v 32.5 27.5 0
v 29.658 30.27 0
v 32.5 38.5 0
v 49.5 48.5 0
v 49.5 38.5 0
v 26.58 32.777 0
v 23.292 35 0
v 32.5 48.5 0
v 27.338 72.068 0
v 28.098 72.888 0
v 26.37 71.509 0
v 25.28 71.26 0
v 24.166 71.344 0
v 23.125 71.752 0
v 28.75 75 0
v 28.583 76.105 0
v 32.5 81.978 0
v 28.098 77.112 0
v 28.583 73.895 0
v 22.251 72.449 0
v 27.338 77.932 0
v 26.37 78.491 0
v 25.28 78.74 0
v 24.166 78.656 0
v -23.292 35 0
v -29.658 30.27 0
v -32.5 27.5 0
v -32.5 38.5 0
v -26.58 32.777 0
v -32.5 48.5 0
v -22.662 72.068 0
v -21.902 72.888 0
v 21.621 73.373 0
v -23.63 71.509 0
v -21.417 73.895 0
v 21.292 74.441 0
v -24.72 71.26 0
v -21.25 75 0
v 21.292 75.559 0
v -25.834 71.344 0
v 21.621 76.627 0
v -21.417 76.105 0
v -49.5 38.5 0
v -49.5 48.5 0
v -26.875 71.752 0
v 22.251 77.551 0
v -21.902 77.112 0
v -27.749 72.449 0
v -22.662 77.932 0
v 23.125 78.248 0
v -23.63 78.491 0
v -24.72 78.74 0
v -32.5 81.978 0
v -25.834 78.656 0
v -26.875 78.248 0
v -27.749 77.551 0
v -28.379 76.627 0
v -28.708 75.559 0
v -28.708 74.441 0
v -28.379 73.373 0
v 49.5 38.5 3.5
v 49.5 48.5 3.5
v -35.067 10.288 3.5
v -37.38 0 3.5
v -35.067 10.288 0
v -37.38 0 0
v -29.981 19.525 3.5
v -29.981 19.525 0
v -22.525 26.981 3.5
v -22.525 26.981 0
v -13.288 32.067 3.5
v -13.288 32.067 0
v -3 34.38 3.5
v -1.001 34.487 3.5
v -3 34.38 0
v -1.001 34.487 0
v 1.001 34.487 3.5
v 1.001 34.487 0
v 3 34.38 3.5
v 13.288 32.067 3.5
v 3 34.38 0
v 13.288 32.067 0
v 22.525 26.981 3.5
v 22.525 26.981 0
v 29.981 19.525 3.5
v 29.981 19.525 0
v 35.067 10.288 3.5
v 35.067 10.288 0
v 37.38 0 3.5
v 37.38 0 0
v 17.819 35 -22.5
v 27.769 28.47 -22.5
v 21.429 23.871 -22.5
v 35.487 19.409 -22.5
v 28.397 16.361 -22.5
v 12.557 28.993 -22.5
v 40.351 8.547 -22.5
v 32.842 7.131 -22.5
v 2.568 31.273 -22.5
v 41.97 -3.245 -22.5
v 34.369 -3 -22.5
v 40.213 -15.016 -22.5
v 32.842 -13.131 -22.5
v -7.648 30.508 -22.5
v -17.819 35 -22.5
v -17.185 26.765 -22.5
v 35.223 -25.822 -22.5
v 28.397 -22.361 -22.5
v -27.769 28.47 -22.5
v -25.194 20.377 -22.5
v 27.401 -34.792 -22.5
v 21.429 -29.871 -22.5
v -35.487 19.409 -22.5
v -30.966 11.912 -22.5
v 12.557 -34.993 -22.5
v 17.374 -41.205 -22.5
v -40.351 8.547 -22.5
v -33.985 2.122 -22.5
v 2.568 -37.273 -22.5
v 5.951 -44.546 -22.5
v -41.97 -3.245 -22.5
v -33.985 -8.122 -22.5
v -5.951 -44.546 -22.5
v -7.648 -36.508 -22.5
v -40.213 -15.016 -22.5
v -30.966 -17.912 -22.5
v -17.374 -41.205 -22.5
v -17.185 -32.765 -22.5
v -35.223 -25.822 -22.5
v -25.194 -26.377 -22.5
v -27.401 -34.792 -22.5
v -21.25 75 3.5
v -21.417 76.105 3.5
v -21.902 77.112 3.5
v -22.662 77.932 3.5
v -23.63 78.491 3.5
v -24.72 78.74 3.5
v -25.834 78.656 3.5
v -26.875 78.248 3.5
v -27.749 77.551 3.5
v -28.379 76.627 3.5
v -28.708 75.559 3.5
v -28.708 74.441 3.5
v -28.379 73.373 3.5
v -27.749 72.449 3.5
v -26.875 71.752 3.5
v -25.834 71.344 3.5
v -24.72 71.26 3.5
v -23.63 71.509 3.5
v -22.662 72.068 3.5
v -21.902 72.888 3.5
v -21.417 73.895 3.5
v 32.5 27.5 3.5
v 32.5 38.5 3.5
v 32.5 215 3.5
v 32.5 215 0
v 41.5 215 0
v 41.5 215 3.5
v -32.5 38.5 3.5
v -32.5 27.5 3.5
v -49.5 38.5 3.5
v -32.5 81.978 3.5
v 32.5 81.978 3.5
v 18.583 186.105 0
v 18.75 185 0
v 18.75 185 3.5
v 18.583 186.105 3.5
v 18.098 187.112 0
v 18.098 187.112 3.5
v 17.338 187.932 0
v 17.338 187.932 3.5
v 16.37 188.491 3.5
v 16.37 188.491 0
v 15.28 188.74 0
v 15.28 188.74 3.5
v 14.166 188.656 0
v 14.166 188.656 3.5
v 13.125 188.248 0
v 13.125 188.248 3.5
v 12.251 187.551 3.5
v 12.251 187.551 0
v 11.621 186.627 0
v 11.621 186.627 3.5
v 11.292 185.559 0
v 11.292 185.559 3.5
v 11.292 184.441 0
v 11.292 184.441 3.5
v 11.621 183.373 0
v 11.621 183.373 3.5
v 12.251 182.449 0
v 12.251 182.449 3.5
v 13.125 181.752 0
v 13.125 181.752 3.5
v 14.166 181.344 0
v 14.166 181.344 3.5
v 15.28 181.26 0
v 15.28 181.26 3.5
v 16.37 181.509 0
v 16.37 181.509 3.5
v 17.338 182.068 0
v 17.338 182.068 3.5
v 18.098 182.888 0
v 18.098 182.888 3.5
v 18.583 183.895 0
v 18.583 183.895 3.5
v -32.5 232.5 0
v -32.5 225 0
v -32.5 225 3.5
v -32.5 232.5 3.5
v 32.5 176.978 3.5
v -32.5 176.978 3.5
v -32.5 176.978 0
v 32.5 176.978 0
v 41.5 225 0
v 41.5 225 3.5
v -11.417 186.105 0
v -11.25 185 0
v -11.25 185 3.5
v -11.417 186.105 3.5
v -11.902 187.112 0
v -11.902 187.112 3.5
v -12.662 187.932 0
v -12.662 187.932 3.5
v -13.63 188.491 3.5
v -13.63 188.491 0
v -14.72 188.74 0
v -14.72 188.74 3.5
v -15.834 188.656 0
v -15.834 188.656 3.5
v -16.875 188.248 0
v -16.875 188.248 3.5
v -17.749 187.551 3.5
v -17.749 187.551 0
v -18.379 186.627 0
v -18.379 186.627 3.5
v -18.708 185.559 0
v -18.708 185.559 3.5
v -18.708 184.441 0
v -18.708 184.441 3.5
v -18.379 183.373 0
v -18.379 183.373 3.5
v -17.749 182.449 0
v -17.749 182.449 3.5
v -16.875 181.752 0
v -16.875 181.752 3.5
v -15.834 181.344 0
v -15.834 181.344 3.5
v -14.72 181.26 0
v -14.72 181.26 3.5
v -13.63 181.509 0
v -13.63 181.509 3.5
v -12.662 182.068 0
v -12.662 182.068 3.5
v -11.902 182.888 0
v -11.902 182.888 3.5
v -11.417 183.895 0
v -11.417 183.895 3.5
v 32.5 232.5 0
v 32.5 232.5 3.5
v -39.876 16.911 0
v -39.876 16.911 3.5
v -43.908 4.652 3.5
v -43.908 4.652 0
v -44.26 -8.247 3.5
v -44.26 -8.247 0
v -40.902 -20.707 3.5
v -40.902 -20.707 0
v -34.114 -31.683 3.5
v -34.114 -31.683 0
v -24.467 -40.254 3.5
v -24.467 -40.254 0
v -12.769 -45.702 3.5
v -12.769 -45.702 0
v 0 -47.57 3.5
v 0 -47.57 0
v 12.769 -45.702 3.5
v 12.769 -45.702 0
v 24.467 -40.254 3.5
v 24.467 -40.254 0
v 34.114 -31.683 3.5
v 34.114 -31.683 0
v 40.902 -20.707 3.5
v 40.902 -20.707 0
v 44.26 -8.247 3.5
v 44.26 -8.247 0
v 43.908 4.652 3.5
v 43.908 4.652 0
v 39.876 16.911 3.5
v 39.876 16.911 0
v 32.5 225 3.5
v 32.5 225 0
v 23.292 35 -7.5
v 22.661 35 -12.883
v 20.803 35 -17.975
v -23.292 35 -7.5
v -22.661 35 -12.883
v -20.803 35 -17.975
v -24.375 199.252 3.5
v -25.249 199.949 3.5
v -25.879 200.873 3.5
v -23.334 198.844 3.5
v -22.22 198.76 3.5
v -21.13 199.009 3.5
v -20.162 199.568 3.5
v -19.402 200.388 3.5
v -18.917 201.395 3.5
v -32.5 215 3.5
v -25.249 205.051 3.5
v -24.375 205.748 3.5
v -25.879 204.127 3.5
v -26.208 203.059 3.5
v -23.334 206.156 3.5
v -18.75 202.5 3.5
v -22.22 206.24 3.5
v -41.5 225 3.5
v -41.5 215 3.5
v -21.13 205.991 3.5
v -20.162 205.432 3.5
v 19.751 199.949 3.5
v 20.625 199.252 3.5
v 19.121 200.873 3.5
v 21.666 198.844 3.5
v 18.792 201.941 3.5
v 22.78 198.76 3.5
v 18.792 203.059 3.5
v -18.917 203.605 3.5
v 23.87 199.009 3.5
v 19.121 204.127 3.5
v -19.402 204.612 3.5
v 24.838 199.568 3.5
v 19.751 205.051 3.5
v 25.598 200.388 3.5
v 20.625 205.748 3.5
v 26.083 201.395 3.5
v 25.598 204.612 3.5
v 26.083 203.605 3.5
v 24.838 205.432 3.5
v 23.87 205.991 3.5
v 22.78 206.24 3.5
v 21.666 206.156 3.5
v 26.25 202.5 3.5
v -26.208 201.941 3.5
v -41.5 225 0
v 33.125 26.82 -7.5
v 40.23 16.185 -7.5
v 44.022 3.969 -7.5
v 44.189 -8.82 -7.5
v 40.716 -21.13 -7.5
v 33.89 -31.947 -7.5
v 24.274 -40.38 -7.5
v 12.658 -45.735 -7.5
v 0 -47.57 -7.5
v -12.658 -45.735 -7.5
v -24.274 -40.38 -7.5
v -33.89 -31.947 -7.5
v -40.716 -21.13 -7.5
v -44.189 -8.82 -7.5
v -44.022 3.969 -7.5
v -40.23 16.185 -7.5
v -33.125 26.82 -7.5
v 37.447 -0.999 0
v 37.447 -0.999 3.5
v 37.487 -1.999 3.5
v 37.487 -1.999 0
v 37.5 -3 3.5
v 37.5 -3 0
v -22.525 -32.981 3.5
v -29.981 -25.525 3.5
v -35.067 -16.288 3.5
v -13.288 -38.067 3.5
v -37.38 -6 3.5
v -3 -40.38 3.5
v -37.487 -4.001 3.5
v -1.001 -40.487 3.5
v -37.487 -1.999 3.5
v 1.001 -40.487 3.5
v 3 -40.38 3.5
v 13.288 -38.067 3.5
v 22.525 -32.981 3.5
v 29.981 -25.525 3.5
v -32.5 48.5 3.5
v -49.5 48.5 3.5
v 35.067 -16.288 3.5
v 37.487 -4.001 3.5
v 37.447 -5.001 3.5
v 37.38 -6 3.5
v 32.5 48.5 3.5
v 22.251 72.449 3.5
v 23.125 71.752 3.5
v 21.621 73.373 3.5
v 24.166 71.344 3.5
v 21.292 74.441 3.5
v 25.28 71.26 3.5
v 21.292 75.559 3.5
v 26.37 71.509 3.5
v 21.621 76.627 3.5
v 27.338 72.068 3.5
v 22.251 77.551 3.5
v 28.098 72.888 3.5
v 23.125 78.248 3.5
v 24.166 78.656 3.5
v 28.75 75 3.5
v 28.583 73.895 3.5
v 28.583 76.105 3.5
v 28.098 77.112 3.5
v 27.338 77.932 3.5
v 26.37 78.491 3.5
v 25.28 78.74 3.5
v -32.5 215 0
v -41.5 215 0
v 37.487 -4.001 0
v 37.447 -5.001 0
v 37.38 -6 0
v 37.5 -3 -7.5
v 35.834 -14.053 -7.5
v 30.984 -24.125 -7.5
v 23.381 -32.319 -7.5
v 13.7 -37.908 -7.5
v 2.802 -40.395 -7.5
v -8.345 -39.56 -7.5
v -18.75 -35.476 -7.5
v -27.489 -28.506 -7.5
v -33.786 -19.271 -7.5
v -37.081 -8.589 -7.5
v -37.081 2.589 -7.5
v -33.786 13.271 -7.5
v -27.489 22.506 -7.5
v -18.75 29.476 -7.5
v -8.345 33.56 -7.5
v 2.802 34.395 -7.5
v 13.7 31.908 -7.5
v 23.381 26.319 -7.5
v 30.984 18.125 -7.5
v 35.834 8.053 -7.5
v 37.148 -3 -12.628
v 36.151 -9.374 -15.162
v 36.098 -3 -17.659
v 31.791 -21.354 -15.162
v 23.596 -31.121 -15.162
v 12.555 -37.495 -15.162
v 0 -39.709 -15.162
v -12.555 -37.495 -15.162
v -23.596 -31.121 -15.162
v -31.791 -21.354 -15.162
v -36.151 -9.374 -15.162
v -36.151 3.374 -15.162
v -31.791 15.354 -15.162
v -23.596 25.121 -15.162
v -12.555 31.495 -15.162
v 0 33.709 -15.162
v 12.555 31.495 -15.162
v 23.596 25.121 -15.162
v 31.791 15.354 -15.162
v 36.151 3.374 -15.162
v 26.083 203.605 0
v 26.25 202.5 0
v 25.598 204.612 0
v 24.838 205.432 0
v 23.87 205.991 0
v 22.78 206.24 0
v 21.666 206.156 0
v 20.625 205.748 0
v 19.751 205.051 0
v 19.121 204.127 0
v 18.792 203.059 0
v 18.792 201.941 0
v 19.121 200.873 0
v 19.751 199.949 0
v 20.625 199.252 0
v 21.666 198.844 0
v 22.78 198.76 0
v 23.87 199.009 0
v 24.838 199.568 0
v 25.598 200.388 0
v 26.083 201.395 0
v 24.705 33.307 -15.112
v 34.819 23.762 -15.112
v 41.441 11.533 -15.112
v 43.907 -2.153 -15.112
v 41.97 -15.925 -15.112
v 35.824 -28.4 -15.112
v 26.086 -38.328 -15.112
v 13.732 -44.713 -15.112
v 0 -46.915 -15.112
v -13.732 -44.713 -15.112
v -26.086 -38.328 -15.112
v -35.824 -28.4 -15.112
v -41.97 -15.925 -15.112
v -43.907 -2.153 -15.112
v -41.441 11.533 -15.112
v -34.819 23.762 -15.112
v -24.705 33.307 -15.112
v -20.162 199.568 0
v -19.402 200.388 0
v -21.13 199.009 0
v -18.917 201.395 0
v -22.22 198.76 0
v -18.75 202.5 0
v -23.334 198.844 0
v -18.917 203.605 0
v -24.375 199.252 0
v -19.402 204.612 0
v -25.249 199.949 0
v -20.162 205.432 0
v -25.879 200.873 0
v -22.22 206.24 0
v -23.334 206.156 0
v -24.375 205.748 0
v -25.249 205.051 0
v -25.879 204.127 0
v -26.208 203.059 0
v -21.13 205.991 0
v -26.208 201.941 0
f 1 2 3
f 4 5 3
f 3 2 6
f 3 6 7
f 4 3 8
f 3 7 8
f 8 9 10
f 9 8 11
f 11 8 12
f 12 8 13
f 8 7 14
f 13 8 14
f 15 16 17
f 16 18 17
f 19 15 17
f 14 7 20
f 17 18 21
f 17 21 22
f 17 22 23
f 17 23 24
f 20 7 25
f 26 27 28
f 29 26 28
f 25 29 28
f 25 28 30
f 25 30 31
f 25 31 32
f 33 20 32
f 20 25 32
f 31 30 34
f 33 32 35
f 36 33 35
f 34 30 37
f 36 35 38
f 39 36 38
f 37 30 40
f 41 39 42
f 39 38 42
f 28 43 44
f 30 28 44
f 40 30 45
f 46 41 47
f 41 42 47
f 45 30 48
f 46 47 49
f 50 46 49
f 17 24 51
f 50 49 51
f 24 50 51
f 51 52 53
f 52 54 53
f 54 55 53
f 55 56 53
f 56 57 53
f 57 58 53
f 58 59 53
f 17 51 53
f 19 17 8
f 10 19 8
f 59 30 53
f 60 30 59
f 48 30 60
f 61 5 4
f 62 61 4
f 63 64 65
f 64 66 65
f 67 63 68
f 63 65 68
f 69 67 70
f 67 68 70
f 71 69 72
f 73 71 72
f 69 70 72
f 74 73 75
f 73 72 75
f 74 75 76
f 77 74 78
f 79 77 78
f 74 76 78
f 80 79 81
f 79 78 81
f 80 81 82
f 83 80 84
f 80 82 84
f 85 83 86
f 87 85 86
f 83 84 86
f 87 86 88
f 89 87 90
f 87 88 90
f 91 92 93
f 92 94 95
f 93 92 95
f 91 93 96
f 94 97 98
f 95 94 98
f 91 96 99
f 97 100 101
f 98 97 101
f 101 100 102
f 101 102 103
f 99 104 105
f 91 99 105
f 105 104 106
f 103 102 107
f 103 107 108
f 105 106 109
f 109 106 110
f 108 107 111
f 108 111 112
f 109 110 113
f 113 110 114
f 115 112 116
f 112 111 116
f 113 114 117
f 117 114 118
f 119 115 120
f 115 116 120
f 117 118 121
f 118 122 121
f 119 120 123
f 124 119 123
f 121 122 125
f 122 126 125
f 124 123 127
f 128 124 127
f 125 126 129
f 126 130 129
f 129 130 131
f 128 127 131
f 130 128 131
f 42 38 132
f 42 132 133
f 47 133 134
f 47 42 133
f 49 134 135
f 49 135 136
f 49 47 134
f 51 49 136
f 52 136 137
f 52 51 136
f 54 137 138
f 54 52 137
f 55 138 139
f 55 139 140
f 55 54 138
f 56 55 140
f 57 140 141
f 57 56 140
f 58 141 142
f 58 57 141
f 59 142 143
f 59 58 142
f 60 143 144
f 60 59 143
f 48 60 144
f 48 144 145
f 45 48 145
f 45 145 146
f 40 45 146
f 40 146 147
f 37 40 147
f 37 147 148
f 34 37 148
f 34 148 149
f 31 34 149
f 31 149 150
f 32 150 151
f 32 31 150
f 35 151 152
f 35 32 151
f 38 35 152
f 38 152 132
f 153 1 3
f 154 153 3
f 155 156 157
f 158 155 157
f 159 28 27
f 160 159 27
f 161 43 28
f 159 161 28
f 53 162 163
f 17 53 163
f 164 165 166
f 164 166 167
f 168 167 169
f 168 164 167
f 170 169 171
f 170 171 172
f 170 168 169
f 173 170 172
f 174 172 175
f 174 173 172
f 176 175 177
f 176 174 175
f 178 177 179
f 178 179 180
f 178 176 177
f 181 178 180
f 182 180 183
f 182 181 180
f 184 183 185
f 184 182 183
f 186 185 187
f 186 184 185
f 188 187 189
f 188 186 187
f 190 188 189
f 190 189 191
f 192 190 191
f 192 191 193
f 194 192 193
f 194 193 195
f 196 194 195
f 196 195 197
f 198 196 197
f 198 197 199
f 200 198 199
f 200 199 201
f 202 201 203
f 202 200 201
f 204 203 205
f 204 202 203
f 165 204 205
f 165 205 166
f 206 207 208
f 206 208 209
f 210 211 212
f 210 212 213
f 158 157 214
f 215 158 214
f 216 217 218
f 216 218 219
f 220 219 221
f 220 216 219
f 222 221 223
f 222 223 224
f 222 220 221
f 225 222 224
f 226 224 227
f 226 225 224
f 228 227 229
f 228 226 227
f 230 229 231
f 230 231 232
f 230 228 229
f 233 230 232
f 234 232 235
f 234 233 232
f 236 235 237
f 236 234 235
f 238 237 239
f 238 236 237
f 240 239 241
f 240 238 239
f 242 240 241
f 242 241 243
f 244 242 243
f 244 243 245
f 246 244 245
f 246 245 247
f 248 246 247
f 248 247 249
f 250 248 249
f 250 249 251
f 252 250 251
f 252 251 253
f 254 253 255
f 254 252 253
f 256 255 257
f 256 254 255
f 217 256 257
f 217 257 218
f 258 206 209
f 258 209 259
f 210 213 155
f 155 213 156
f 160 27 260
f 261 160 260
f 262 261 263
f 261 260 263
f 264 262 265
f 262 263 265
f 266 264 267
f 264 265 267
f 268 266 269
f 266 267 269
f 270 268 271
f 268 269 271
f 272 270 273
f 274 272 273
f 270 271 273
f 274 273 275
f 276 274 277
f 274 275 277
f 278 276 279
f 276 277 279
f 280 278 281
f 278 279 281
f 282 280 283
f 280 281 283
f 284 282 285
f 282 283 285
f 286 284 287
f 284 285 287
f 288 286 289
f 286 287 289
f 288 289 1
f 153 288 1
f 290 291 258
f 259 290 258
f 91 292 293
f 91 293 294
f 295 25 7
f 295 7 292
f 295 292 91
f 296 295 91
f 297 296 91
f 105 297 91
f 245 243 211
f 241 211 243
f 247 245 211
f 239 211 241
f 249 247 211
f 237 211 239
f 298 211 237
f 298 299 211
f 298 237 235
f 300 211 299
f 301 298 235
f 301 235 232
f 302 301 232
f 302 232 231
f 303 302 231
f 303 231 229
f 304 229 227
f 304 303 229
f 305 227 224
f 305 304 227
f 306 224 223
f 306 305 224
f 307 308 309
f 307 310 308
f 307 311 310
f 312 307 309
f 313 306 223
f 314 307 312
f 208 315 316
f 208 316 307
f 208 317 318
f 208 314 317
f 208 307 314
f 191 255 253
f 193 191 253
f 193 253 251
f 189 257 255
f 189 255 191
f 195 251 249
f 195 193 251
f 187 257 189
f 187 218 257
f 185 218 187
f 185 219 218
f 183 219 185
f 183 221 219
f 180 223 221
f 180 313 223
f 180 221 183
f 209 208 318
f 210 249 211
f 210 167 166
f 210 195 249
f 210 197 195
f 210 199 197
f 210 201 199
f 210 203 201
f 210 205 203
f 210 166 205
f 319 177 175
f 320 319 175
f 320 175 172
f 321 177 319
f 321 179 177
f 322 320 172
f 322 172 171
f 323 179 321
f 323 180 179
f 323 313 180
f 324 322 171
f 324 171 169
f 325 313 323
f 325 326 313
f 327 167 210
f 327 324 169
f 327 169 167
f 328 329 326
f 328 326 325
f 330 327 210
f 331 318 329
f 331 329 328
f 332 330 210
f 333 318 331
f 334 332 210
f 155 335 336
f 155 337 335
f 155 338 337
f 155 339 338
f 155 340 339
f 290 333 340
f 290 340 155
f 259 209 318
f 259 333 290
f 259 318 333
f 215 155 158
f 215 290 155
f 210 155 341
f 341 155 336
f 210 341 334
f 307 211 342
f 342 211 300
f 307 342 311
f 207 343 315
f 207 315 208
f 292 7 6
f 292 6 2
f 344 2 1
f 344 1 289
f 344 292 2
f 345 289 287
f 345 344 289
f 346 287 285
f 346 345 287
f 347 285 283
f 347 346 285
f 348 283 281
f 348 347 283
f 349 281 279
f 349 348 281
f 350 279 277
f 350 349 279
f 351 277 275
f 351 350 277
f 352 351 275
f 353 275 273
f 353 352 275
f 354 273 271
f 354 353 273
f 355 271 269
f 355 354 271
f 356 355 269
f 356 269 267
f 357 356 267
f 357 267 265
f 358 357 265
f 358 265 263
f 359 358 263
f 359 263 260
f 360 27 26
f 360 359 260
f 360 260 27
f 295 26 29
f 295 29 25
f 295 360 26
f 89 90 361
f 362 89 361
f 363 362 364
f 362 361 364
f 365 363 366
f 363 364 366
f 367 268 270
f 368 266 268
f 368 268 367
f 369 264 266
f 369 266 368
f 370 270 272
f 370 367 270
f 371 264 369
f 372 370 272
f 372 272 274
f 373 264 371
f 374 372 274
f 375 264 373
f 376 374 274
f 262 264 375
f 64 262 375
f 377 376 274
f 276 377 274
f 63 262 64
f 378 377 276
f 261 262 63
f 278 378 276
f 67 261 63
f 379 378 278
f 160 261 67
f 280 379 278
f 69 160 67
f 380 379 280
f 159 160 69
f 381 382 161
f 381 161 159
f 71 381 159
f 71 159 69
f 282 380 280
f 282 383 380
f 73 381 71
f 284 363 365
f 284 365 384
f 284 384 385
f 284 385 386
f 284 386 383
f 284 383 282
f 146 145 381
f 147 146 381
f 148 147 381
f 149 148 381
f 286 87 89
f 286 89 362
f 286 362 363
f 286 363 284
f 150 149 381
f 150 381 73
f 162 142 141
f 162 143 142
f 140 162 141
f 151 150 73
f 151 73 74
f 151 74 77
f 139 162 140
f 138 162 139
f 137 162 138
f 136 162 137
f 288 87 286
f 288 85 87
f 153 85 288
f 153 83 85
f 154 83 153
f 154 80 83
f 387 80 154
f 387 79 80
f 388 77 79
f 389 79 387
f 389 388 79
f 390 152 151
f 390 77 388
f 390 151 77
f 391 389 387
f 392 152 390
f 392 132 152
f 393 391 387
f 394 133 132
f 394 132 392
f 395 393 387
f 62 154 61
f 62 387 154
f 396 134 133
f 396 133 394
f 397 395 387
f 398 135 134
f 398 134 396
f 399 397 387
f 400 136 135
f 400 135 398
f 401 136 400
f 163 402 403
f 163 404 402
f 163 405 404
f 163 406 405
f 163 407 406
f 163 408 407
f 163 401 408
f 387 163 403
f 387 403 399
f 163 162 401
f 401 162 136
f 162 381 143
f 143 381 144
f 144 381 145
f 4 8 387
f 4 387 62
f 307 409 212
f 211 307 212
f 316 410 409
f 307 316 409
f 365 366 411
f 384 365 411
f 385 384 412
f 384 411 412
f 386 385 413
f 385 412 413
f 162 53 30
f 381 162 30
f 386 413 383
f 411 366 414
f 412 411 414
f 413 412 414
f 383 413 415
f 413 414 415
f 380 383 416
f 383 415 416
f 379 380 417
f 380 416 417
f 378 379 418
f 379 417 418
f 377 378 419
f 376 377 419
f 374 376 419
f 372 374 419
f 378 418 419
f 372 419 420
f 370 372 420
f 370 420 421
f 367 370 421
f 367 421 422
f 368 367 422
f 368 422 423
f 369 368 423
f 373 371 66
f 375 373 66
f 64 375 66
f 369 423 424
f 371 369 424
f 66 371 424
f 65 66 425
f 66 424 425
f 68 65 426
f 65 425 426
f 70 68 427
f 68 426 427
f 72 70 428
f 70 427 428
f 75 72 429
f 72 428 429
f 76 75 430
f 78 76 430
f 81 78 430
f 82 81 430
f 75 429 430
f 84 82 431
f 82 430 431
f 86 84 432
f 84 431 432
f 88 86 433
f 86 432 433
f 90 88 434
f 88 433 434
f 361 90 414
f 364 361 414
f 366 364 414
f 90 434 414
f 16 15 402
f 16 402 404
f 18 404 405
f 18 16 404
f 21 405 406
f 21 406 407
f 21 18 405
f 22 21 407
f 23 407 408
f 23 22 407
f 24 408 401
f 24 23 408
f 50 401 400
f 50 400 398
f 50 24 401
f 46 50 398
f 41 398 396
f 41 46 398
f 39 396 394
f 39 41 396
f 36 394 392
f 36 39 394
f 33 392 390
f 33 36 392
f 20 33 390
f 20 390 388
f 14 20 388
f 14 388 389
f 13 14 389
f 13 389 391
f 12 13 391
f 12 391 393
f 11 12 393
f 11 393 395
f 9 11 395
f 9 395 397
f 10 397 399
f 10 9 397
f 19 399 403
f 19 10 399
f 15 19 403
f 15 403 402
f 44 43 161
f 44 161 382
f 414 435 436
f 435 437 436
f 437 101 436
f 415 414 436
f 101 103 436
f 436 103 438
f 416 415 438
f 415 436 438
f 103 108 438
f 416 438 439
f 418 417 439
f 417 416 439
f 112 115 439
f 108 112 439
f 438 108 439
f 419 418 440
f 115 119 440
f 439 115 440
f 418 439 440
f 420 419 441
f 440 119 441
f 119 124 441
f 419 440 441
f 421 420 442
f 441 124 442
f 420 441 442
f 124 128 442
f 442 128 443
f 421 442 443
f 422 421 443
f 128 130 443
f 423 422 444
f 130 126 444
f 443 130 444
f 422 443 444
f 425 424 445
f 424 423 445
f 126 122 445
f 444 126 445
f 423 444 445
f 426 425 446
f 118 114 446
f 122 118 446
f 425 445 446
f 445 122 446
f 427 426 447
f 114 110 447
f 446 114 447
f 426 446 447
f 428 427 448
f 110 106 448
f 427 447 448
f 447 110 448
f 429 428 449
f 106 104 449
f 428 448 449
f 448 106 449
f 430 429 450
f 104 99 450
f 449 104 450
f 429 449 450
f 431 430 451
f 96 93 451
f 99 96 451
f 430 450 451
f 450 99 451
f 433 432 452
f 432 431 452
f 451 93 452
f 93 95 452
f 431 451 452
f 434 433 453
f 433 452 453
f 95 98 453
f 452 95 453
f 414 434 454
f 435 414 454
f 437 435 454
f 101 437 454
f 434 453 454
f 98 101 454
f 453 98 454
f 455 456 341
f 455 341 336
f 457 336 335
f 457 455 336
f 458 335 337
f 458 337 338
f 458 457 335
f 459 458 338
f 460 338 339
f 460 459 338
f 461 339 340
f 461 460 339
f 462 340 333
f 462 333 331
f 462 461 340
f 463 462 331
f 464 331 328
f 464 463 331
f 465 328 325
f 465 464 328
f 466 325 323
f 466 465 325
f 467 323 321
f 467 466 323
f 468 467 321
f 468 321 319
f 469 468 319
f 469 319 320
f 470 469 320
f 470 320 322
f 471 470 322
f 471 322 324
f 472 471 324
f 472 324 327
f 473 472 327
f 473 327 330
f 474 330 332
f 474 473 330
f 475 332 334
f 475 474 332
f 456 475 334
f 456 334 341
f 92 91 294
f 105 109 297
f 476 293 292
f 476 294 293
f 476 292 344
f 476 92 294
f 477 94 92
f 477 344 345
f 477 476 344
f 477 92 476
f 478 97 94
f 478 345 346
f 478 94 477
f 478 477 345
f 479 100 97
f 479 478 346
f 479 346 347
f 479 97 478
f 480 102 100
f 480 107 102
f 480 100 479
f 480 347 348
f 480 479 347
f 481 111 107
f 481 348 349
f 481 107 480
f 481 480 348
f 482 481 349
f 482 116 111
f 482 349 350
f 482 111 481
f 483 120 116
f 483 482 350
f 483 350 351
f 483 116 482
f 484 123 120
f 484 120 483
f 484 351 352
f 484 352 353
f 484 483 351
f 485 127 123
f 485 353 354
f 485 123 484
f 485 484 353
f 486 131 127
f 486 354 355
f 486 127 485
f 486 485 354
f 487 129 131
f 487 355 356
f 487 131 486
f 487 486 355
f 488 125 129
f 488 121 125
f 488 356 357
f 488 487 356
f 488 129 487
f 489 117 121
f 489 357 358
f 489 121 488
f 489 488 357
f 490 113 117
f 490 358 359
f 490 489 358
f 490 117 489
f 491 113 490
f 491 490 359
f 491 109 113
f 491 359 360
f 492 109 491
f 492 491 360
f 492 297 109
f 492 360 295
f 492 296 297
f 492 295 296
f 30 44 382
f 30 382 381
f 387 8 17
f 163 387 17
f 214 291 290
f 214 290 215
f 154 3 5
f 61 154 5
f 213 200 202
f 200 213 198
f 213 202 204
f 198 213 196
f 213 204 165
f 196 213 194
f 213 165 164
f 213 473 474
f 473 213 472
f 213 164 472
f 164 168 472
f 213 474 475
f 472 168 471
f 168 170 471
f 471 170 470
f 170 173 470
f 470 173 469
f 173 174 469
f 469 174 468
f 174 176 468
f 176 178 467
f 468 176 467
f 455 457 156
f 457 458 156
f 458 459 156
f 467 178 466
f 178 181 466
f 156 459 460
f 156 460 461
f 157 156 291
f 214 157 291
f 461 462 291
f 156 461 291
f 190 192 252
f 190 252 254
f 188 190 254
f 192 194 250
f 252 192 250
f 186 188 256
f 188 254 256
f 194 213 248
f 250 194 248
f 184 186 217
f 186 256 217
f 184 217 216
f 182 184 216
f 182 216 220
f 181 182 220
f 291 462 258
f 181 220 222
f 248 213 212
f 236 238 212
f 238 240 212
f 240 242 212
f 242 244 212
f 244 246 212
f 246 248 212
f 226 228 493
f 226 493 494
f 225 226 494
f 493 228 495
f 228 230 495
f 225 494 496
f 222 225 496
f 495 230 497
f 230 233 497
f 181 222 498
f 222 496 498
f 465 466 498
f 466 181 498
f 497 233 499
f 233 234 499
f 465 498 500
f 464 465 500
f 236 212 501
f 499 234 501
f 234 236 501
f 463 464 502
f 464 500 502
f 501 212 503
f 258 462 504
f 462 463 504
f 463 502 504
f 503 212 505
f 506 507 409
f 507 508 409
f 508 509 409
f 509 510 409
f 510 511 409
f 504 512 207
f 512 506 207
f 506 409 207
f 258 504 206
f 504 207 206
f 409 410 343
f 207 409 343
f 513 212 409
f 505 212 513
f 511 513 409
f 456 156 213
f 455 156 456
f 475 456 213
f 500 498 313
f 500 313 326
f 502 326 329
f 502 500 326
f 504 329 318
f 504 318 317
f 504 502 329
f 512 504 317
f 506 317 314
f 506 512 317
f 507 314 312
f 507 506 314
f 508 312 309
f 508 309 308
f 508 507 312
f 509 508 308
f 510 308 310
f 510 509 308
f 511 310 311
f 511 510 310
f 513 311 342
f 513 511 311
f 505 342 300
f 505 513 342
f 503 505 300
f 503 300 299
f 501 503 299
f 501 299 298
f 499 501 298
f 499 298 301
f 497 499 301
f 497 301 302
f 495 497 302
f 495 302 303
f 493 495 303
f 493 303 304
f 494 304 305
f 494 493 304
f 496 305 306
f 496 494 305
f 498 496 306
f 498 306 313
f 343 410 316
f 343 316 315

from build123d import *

# Parameters (mm, degrees)
SKETCH1_R               = 3.75
SKETCH1_W               = 65
SKETCH1_H               = 7.5
SKETCH1_W_2             = 9
SKETCH1_H_2             = 10
SKETCH1_W_3             = 4.5
SKETCH1_W_4             = 12.5
BOSS_EXTRUDE1_DEPTH     = 3.5
CUT_EXTRUDE1_DEPTH      = 248.561103568
CUT_EXTRUDE1_DEPTH_BACK = 248.561103568
SKETCH3_W               = 40.007477242
SKETCH3_H               = 30.684168747
BOSS_EXTRUDE2_DEPTH     = 3.75
SKETCH5_W               = 110
SKETCH5_H               = 95
CUT_EXTRUDE2_DEPTH      = 50


with BuildPart() as part:
    # Sketch1 → Boss-Extrude1 (new body)
    # profile 1 of 9: a face of its own
    with BuildSketch(Plane.XY):
        Polygon((10, 98.461538462), (10, 161.538461538), (32.5, 174.528842595), (32.5, 215), (32.5, 225), (-32.5, 225), (-32.5, 215), (-32.5, 174.528842595), (-10, 161.538461538), (-10, 98.461538462), (-32.5, 90.272208191), (-32.5, 48.5), (-32.5, 38.5), (-32.5, 35), (32.5, 35), (32.5, 38.5), (32.5, 48.5), (32.5, 90.272208191), align=None)
        with Locations((-25, 75)):
            Circle(SKETCH1_R, mode=Mode.SUBTRACT)
        with Locations((25, 75)):
            Circle(SKETCH1_R, mode=Mode.SUBTRACT)
        with Locations((-15, 185)):
            Circle(SKETCH1_R, mode=Mode.SUBTRACT)
        with Locations((-22.5, 202.5)):
            Circle(SKETCH1_R, mode=Mode.SUBTRACT)
        with Locations((15, 185)):
            Circle(SKETCH1_R, mode=Mode.SUBTRACT)
        with Locations((22.5, 202.5)):
            Circle(SKETCH1_R, mode=Mode.SUBTRACT)
    # profile 2 of 9: a face of its own
    with BuildSketch(Plane.XY):
        with Locations((0, 228.75)):
            Rectangle(SKETCH1_W, SKETCH1_H)
    # profile 3 of 9: a face of its own
    with BuildSketch(Plane.XY):
        with BuildLine():
            Line((32.5, 27.5), (32.5, 35))
            Line((32.5, 35), (-32.5, 35))
            Line((-32.5, 35), (-32.5, 27.5))
            ThreePointArc((-32.5, 27.5), (0, -47.570169396), (32.5, 27.5))
        make_face()
        with BuildLine():
            ThreePointArc((3, -40.379807383), (0, -40.5), (-3, -40.379807383))
            ThreePointArc((-3, -40.379807383), (-26.516504294, -29.516504294), (-37.379807383, -6))
            ThreePointArc((-37.379807383, -6), (-37.5, -3), (-37.379807383, 0))
            ThreePointArc((-37.379807383, 0), (-26.516504294, 23.516504294), (-3, 34.379807383))
            ThreePointArc((-3, 34.379807383), (0, 34.5), (3, 34.379807383))
            ThreePointArc((3, 34.379807383), (26.516504294, 23.516504294), (37.379807383, 0))
            ThreePointArc((37.379807383, 0), (37.469939798, -1.498796627), (37.5, -3))
            ThreePointArc((37.5, -3), (37.469939798, -4.501203373), (37.379807383, -6))
            ThreePointArc((37.379807383, -6), (26.516504294, -29.516504294), (3, -40.379807383))
        make_face(mode=Mode.SUBTRACT)
    # profile 4 of 9: a face of its own
    with BuildSketch(Plane.XY):
        with Locations((-37, 220)):
            Rectangle(SKETCH1_W_2, SKETCH1_H_2)
    # profile 5 of 9: a face of its own
    with BuildSketch(Plane.XY):
        with Locations((37, 220)):
            Rectangle(SKETCH1_W_2, SKETCH1_H_2)
    # profile 6 of 9: a face of its own
    with BuildSketch(Plane.XY):
        with Locations((-47.25, 43.5)):
            Rectangle(SKETCH1_W_3, SKETCH1_H_2)
    # profile 7 of 9: a face of its own
    with BuildSketch(Plane.XY):
        with Locations((-38.75, 43.5)):
            Rectangle(SKETCH1_W_4, SKETCH1_H_2)
    # profile 8 of 9: a face of its own
    with BuildSketch(Plane.XY):
        with Locations((38.75, 43.5)):
            Rectangle(SKETCH1_W_4, SKETCH1_H_2)
    # profile 9 of 9: a face of its own
    with BuildSketch(Plane.XY):
        with Locations((47.25, 43.5)):
            Rectangle(SKETCH1_W_3, SKETCH1_H_2)
    extrude(amount=BOSS_EXTRUDE1_DEPTH)

    # Sketch2 → Revolve1 (revolve)
    with BuildSketch(Plane(origin=(0, 0, 0), x_dir=(0, 0, -1), z_dir=(1, 0, 0)), mode=Mode.PRIVATE) as revolve1_sk:
        with BuildLine():
            Line((22.5, 31.369317712), (22.5, 38.970227543))
            Line((22.5, 38.970227543), (0, 38.970227543))
            Line((0, 38.970227543), (0, 34.5))
            Line((0, 34.5), (7.5, 34.5))
            ThreePointArc((7.5, 34.5), (15.161611638, 33.708986735), (22.5, 31.369317712))
        make_face()
        with BuildLine():
            ThreePointArc((7.5, -47.570169396), (15.111827928, -46.915374023), (22.5, -44.970227543))
            Line((22.5, -44.970227543), (22.5, -37.369317712))
            ThreePointArc((22.5, -37.369317712), (15.161611638, -39.708986735), (7.5, -40.5))
            Line((7.5, -40.5), (0, -40.5))
            Line((0, -40.5), (0, -47.570169396))
            Line((0, -47.570169396), (7.5, -47.570169396))
        make_face()
    revolve(revolve1_sk.sketch.rotate(Axis((0, -3, 0), (0, 0, -1)), 90), axis=Axis((0, -3, 0), (0, 0, -1)))

    # Sketch3 → Cut-Extrude1 (cut, two sides: drawn at the far end of the back side and taken through both)
    with BuildSketch(Plane(origin=(32.5, 0, 0), x_dir=(0, 0, -1), z_dir=(1, 0, 0)).offset(-CUT_EXTRUDE1_DEPTH_BACK)):
        with Locations((20.003738621, 50.342084374)):
            Rectangle(SKETCH3_W, SKETCH3_H)
    extrude(amount=CUT_EXTRUDE1_DEPTH + CUT_EXTRUDE1_DEPTH_BACK, mode=Mode.SUBTRACT)

    # Sketch4 → Boss-Extrude2 (add, symmetric)
    with BuildSketch(Plane(origin=(0, 130, 0), x_dir=(1, 0, 0), z_dir=(0, 1, 0))):
        Polygon((50, -3.5), (50, 26.5), (45, 26.5), (45, 0), (10, 0), (10, -3.5), align=None)
    boss_extrude2 = extrude(amount=BOSS_EXTRUDE2_DEPTH, both=True)

    # Mirror1: Boss-Extrude2 across plane
    add(boss_extrude2.mirror(Plane(origin=(0, 0, 0), x_dir=(0, 0, 1), z_dir=(1, 0, 0))))

    # Sketch5 → Cut-Extrude2 (cut)
    with BuildSketch(Plane.XY.offset(3.5)):
        with Locations((0.095917122, 129.477753892)):
            Rectangle(SKETCH5_W, SKETCH5_H)
    extrude(amount=-CUT_EXTRUDE2_DEPTH, mode=Mode.SUBTRACT)


with BuildPart() as cut_extrude2_piece_1:
    # of the separate pieces the step leaves, piece 1, a body of its own (cut_extrude2_pieces)
    add(part.part.solids().sort_by_distance((32.5, 81.977753892, 3.5))[0])


with BuildPart() as cut_extrude2_piece_2:
    # of the separate pieces the step leaves, piece 2, a body of its own (cut_extrude2_pieces)
    add(part.part.solids().sort_by_distance((-32.5, 176.977753892, 3.5))[0])


solid = Compound([cut_extrude2_piece_1.part, cut_extrude2_piece_2.part])
